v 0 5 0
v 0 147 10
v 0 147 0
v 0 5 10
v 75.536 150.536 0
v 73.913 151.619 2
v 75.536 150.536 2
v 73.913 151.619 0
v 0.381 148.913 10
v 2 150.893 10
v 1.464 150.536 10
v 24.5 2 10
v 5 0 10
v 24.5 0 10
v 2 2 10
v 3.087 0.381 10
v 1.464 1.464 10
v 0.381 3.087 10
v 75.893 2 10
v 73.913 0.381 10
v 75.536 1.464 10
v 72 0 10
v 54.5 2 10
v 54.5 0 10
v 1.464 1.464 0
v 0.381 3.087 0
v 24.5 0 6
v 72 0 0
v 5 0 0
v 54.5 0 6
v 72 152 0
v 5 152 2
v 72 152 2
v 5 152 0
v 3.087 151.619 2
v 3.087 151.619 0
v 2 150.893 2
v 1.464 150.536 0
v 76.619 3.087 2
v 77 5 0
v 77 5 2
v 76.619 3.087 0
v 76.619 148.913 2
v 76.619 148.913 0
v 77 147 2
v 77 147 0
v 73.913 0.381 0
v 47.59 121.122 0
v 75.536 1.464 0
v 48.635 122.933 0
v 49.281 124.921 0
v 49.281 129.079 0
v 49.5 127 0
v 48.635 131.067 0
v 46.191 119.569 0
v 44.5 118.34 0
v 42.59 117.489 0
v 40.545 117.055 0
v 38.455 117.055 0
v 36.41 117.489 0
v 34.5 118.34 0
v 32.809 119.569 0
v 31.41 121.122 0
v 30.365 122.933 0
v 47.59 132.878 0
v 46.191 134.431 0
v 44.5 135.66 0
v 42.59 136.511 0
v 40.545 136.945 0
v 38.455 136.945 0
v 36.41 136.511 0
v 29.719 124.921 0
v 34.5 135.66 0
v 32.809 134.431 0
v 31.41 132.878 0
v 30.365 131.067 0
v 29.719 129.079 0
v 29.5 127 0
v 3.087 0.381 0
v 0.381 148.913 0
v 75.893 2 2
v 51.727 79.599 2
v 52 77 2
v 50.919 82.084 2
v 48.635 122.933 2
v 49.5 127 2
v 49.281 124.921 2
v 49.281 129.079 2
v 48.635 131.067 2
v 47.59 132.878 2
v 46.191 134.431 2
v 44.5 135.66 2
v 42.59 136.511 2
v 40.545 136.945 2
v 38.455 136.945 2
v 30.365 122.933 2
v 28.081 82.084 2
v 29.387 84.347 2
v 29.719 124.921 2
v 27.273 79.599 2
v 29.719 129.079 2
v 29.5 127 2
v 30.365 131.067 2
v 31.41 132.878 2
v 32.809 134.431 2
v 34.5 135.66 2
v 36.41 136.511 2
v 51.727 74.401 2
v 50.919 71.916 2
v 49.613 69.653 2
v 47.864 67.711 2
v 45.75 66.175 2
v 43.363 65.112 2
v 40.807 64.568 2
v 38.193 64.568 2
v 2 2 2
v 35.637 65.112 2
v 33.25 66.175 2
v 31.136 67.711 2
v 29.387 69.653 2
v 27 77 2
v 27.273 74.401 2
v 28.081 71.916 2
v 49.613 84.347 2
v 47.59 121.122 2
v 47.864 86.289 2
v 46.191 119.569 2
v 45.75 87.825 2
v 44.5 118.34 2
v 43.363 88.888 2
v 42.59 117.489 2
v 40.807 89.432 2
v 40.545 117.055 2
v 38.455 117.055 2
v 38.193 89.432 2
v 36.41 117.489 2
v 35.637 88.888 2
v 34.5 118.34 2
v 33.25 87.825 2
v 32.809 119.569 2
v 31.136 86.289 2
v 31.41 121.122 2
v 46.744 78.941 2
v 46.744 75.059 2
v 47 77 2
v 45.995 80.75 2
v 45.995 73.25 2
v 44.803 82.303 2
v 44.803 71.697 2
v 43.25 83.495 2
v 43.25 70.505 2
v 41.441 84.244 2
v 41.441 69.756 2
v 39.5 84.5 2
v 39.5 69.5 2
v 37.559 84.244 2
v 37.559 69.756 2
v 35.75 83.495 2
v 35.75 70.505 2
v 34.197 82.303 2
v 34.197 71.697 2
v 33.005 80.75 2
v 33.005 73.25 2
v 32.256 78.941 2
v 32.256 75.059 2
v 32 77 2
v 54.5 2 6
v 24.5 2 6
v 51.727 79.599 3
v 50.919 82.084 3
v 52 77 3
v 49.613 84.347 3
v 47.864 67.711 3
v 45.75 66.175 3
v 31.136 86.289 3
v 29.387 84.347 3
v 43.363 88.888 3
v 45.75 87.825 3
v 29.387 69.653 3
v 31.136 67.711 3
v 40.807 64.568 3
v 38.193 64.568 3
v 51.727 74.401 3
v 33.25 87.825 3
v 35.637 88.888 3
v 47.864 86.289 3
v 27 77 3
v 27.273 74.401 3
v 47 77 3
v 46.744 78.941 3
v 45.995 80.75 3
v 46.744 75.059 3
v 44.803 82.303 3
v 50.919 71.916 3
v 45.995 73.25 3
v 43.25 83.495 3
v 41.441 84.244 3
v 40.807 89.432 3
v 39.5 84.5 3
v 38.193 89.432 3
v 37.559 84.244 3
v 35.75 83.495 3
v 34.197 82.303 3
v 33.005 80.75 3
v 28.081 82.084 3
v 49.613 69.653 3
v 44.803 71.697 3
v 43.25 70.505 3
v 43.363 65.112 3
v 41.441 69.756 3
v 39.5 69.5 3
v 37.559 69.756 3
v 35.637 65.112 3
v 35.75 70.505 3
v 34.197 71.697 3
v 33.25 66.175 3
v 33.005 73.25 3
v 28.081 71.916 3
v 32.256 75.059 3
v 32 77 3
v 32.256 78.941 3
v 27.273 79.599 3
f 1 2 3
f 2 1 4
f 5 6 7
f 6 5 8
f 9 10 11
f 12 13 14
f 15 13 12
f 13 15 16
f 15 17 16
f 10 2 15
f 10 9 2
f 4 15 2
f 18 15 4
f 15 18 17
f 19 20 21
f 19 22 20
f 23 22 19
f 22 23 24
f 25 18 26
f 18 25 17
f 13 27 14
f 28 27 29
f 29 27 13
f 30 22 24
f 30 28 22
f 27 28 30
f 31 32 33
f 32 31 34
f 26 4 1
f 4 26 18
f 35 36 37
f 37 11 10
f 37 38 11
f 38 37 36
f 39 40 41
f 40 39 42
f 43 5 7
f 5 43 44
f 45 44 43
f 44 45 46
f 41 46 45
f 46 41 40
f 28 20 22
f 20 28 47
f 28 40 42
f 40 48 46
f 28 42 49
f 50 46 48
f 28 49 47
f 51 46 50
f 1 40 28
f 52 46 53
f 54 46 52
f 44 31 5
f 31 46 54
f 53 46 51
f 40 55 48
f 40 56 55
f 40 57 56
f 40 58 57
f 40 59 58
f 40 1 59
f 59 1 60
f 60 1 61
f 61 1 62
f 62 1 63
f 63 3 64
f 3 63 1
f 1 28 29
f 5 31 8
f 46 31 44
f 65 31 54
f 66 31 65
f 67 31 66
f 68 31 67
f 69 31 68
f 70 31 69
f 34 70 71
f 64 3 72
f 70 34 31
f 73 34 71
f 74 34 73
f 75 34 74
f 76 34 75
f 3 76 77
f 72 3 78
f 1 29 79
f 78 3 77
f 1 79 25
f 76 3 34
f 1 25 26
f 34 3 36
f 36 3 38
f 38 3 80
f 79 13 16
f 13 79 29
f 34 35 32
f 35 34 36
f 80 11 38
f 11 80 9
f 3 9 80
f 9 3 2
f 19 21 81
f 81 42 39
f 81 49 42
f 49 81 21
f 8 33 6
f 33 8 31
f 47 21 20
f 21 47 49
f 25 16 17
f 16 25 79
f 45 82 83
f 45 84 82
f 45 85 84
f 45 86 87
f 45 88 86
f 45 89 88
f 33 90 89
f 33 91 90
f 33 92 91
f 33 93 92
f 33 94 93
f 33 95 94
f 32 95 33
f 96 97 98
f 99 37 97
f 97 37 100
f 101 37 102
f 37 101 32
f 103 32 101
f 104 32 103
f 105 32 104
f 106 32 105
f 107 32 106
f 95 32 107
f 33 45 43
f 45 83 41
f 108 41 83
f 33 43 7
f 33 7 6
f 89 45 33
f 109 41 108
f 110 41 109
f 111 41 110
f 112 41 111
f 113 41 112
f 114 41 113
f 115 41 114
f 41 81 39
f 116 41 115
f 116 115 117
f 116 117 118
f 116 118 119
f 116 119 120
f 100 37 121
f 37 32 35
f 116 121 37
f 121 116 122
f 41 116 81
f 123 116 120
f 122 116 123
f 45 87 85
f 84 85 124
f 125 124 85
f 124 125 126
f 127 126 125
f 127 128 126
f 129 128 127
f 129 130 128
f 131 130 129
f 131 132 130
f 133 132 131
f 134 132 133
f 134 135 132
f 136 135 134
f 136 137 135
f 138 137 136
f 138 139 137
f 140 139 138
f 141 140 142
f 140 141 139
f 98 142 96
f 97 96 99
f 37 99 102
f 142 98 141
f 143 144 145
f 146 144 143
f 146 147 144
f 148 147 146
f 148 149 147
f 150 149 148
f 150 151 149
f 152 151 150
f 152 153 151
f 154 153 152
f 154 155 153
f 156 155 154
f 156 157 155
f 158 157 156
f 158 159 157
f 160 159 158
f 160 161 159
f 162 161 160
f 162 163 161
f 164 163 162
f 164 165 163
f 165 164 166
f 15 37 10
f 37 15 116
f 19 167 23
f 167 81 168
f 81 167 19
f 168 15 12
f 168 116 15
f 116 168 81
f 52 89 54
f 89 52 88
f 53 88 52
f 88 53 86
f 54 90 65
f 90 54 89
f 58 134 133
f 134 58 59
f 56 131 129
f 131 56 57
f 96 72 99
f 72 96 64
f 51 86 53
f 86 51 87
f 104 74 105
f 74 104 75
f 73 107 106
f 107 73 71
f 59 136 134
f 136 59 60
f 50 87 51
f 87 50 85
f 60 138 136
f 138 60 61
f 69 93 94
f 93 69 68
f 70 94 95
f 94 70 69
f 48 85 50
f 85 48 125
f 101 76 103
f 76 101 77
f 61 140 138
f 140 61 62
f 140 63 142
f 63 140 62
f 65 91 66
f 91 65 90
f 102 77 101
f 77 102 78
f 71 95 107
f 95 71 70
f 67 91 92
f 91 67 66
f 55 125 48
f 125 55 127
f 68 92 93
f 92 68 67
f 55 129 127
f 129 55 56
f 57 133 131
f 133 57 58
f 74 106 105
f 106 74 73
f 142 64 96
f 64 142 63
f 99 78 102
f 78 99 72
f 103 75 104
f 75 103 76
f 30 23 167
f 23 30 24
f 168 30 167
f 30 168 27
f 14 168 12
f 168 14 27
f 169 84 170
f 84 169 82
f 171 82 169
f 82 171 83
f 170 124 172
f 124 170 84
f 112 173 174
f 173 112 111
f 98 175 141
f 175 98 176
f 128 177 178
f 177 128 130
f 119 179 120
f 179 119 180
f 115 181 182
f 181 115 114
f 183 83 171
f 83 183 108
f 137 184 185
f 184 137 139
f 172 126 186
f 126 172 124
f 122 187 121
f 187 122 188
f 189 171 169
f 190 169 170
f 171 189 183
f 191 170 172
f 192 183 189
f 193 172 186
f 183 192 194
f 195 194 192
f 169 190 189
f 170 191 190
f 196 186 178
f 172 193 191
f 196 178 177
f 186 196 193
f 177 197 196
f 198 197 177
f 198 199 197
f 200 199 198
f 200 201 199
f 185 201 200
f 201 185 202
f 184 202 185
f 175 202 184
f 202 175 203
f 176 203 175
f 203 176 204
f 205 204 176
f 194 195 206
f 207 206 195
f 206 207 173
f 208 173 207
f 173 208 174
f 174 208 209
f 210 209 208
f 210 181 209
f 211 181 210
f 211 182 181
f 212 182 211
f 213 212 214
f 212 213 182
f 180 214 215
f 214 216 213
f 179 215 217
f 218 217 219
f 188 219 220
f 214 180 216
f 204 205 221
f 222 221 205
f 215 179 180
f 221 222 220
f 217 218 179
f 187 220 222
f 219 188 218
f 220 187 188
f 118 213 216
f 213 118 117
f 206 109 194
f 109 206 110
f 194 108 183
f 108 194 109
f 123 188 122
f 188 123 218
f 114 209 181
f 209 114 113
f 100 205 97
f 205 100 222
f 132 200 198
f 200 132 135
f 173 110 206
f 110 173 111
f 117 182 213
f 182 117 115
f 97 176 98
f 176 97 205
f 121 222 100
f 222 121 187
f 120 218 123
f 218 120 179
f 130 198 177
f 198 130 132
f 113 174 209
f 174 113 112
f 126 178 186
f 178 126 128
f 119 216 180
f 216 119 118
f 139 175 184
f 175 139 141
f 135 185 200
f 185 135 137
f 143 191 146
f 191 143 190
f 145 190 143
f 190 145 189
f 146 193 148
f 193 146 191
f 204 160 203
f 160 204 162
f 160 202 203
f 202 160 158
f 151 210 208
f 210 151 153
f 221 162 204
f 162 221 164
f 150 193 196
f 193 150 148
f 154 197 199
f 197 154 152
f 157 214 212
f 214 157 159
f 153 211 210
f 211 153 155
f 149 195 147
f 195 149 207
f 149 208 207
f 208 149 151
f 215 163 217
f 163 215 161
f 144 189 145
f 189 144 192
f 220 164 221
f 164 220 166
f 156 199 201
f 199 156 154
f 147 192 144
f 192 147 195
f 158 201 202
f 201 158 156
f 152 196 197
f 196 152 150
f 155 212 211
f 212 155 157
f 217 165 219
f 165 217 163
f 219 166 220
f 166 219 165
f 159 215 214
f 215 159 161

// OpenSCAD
// phone_case.scad - Parametric Phone Case Example
// This example shows how to create a customizable phone case with camera cutouts

// Parameters - users can modify these
phone_width = 75;      // Width of phone in mm
phone_height = 150;    // Height of phone in mm  
phone_thickness = 8;   // Thickness of phone in mm
case_thickness = 2;    // Wall thickness of case
camera_diameter = 20;  // Diameter of camera cutout
corner_radius = 5;     // Rounded corner radius

// Main phone case
difference() {
    // Outer case with rounded corners
    hull() {
        translate([corner_radius, corner_radius, 0])
            cylinder(r=corner_radius, h=phone_thickness + case_thickness);
        translate([phone_width + case_thickness - corner_radius, corner_radius, 0])
            cylinder(r=corner_radius, h=phone_thickness + case_thickness);
        translate([corner_radius, phone_height + case_thickness - corner_radius, 0])
            cylinder(r=corner_radius, h=phone_thickness + case_thickness);
        translate([phone_width + case_thickness - corner_radius, phone_height + case_thickness - corner_radius, 0])
            cylinder(r=corner_radius, h=phone_thickness + case_thickness);
    }
    
    // Inner phone cavity
    translate([case_thickness, case_thickness, case_thickness])
        cube([phone_width, phone_height, phone_thickness + 1]);
    
    // Camera cutout (top center)
    translate([phone_width/2 + case_thickness, phone_height - 25 + case_thickness, -1])
        cylinder(h=case_thickness + 2, d=camera_diameter);
    
    // Charging port cutout (bottom center)
    translate([phone_width/2 + case_thickness - 15, -1, case_thickness + phone_thickness/2])
        cube([30, case_thickness + 2, 8]);
}

// Optional: Add phone case grip rings
translate([phone_width/2 + case_thickness, phone_height/2 + case_thickness, 0]) {
    difference() {
        cylinder(d=25, h=3);
        cylinder(d=15, h=4);
    }
}
